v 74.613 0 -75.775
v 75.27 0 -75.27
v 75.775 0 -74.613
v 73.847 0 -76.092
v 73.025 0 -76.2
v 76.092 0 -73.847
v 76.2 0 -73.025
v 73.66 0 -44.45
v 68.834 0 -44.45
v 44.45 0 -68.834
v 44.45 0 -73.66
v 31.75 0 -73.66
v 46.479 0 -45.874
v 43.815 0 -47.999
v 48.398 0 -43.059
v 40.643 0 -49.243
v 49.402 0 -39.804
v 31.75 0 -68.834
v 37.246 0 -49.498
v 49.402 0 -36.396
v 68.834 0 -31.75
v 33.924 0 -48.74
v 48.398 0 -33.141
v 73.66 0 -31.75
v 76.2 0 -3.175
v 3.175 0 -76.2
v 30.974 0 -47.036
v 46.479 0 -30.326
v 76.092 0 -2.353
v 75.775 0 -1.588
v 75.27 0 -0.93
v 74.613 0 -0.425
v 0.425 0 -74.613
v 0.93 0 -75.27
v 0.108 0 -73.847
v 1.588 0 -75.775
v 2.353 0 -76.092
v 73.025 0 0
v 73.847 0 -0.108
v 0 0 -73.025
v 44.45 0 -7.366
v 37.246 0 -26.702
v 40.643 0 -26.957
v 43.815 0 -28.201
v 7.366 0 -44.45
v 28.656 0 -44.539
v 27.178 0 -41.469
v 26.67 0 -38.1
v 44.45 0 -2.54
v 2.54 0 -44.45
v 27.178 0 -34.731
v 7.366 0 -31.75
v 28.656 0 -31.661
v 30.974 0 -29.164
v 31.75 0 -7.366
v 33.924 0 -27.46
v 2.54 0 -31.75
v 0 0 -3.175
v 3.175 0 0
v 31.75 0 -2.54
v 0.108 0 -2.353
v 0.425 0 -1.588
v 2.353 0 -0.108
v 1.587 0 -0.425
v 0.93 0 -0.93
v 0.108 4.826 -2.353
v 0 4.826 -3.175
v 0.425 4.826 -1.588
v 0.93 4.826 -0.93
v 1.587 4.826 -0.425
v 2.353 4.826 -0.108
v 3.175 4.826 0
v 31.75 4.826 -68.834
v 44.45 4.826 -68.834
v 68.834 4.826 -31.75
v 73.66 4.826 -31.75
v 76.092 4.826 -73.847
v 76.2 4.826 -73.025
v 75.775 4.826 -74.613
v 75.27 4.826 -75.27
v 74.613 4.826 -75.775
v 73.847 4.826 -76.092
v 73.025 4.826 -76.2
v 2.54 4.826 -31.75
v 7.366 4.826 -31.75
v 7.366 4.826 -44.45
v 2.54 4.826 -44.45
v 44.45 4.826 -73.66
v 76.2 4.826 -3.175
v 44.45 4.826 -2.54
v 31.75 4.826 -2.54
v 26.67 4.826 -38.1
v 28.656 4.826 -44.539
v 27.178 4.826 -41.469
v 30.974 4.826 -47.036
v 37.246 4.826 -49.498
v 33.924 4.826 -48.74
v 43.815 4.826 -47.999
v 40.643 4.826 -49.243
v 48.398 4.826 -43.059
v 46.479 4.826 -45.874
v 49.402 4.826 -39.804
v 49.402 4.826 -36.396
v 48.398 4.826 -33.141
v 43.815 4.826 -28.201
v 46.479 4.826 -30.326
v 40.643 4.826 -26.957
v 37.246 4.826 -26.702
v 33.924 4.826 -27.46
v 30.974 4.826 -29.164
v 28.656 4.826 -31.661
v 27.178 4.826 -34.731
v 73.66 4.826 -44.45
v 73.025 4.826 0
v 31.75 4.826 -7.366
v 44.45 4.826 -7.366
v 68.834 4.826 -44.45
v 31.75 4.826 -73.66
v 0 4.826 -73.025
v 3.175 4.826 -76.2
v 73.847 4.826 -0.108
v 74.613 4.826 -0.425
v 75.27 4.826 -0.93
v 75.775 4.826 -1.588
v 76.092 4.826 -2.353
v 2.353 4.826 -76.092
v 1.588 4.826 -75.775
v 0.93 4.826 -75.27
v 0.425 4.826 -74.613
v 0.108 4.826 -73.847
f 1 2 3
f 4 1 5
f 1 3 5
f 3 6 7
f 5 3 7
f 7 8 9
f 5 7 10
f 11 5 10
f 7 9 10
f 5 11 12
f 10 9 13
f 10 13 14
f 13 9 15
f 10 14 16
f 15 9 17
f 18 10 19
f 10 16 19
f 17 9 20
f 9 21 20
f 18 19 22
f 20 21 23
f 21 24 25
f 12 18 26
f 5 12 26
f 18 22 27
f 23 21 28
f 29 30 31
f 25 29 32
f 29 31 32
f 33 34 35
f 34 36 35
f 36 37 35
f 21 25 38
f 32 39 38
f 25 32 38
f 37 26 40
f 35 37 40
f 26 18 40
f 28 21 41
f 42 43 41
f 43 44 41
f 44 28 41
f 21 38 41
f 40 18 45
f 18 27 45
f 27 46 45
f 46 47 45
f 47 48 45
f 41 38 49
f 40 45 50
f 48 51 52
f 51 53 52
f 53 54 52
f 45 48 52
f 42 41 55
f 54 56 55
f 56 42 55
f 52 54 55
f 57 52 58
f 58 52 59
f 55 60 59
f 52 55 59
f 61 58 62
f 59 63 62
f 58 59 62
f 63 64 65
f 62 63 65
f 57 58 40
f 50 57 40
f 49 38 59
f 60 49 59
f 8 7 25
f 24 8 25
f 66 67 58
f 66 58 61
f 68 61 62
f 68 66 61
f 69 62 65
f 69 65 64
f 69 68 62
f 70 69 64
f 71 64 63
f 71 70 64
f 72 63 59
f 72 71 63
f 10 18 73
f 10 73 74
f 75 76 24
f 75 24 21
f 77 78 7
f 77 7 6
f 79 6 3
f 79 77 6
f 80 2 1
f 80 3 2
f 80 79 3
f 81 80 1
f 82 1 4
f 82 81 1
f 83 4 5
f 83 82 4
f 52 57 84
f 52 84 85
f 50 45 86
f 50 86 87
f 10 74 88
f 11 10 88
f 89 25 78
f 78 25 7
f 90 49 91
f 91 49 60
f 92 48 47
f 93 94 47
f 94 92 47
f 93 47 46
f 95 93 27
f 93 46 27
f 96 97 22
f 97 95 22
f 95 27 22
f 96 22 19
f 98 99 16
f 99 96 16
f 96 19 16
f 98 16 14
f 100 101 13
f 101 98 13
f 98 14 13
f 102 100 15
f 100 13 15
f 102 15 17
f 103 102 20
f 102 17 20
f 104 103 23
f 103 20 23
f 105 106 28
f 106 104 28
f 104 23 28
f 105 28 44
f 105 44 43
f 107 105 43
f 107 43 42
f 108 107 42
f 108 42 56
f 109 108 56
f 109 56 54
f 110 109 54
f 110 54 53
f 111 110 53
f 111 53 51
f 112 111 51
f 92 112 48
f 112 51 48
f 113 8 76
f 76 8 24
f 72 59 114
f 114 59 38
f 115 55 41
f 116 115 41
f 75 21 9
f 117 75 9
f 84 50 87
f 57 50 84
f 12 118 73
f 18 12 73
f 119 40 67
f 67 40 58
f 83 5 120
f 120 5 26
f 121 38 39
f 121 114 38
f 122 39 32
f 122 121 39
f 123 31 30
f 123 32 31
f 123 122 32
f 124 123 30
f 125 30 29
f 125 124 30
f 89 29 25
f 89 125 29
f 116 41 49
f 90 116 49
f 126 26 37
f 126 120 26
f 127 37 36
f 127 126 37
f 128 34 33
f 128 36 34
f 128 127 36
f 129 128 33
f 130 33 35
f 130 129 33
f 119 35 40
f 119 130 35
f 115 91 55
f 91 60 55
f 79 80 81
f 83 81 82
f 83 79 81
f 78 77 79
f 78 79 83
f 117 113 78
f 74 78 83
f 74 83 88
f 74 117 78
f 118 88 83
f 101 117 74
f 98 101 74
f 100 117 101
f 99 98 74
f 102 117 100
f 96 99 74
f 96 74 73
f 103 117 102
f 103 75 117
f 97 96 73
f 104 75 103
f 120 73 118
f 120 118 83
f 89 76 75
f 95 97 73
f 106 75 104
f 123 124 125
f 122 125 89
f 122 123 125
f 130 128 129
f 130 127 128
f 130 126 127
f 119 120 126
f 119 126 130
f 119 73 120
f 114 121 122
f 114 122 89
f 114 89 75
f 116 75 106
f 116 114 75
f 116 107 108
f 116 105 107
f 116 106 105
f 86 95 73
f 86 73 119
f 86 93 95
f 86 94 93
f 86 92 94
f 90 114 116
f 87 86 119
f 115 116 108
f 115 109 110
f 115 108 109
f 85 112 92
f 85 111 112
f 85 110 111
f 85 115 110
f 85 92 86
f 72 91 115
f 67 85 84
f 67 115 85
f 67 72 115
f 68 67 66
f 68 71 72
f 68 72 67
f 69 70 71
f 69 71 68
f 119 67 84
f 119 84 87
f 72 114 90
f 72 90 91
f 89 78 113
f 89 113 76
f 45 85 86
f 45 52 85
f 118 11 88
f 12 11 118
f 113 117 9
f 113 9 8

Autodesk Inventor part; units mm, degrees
ref_plane "YZ Plane" through (0, 0, 0) normal (1, 0, 0) x (0, 1, 0)
ref_plane "XZ Plane" through (0, 0, 0) normal (0, 1, 0) x (-1, 0, 0)
ref_plane "XY Plane" through (0, 0, 0) normal (0, 0, 1) x (1, 0, 0)
sketch "Sketch1" plane through (0, 0, 0) normal (0, 1, 0) x (-1, 0, 0)
  line L0 (0, 0) -> (-76.2, 0)
  line L1 (-76.2, 0) -> (-76.2, -76.2)
  line L2 (-76.2, -76.2) -> (0, -76.2)
  line L3 (0, -76.2) -> (0, 0)
  line L4 (-44.45, -73.66) -> (-31.75, -73.66)
  line L5 (-31.75, -73.66) -> (-31.75, -68.834)
  line L6 (-31.75, -68.834) -> (-44.45, -68.834)
  line L7 (-44.45, -68.834) -> (-44.45, -73.66)
  line L8 (-68.834, -31.75) -> (-68.834, -44.45)
  line L9 (-68.834, -44.45) -> (-73.66, -44.45)
  line L10 (-73.66, -31.75) -> (-68.834, -31.75)
  line L11 (-73.66, -44.45) -> (-73.66, -31.75)
  line L12 (-7.366, -44.45) -> (-2.54, -44.45)
  line L13 (-7.366, -31.75) -> (-7.366, -44.45)
  line L14 (-2.54, -44.45) -> (-2.54, -31.75)
  line L15 (-2.54, -31.75) -> (-7.366, -31.75)
  line L16 (-44.45, -2.54) -> (-31.75, -2.54)
  line L17 (-31.75, -2.54) -> (-31.75, -7.366)
  line L18 (-31.75, -7.366) -> (-44.45, -7.366)
  line L19 (-44.45, -7.366) -> (-44.45, -2.54)
  circle A0 centre (-38.1, -38.1) radius 11.43
  dimension "d0" = 76.2
  dimension "d1" = 76.2
  dimension "d6" = 31.75
  dimension "d7" = 2.54
  dimension "d8" = 4.826
  dimension "d9" = 12.7
  dimension "d15" = 31.75
  dimension "d16" = 12.7
  dimension "d17" = 4.826
  dimension "d18" = 22.86
extrude "Extrusion3" add sketch "Sketch1" along normal blind 4.826
fillet "Fillet1" radius 3.175 4 edges at (76.2, 2.413, 0) (0, 2.413, 0) (76.2, 2.413, -76.2) (0, 2.413, -76.2)
properties part number "top"
